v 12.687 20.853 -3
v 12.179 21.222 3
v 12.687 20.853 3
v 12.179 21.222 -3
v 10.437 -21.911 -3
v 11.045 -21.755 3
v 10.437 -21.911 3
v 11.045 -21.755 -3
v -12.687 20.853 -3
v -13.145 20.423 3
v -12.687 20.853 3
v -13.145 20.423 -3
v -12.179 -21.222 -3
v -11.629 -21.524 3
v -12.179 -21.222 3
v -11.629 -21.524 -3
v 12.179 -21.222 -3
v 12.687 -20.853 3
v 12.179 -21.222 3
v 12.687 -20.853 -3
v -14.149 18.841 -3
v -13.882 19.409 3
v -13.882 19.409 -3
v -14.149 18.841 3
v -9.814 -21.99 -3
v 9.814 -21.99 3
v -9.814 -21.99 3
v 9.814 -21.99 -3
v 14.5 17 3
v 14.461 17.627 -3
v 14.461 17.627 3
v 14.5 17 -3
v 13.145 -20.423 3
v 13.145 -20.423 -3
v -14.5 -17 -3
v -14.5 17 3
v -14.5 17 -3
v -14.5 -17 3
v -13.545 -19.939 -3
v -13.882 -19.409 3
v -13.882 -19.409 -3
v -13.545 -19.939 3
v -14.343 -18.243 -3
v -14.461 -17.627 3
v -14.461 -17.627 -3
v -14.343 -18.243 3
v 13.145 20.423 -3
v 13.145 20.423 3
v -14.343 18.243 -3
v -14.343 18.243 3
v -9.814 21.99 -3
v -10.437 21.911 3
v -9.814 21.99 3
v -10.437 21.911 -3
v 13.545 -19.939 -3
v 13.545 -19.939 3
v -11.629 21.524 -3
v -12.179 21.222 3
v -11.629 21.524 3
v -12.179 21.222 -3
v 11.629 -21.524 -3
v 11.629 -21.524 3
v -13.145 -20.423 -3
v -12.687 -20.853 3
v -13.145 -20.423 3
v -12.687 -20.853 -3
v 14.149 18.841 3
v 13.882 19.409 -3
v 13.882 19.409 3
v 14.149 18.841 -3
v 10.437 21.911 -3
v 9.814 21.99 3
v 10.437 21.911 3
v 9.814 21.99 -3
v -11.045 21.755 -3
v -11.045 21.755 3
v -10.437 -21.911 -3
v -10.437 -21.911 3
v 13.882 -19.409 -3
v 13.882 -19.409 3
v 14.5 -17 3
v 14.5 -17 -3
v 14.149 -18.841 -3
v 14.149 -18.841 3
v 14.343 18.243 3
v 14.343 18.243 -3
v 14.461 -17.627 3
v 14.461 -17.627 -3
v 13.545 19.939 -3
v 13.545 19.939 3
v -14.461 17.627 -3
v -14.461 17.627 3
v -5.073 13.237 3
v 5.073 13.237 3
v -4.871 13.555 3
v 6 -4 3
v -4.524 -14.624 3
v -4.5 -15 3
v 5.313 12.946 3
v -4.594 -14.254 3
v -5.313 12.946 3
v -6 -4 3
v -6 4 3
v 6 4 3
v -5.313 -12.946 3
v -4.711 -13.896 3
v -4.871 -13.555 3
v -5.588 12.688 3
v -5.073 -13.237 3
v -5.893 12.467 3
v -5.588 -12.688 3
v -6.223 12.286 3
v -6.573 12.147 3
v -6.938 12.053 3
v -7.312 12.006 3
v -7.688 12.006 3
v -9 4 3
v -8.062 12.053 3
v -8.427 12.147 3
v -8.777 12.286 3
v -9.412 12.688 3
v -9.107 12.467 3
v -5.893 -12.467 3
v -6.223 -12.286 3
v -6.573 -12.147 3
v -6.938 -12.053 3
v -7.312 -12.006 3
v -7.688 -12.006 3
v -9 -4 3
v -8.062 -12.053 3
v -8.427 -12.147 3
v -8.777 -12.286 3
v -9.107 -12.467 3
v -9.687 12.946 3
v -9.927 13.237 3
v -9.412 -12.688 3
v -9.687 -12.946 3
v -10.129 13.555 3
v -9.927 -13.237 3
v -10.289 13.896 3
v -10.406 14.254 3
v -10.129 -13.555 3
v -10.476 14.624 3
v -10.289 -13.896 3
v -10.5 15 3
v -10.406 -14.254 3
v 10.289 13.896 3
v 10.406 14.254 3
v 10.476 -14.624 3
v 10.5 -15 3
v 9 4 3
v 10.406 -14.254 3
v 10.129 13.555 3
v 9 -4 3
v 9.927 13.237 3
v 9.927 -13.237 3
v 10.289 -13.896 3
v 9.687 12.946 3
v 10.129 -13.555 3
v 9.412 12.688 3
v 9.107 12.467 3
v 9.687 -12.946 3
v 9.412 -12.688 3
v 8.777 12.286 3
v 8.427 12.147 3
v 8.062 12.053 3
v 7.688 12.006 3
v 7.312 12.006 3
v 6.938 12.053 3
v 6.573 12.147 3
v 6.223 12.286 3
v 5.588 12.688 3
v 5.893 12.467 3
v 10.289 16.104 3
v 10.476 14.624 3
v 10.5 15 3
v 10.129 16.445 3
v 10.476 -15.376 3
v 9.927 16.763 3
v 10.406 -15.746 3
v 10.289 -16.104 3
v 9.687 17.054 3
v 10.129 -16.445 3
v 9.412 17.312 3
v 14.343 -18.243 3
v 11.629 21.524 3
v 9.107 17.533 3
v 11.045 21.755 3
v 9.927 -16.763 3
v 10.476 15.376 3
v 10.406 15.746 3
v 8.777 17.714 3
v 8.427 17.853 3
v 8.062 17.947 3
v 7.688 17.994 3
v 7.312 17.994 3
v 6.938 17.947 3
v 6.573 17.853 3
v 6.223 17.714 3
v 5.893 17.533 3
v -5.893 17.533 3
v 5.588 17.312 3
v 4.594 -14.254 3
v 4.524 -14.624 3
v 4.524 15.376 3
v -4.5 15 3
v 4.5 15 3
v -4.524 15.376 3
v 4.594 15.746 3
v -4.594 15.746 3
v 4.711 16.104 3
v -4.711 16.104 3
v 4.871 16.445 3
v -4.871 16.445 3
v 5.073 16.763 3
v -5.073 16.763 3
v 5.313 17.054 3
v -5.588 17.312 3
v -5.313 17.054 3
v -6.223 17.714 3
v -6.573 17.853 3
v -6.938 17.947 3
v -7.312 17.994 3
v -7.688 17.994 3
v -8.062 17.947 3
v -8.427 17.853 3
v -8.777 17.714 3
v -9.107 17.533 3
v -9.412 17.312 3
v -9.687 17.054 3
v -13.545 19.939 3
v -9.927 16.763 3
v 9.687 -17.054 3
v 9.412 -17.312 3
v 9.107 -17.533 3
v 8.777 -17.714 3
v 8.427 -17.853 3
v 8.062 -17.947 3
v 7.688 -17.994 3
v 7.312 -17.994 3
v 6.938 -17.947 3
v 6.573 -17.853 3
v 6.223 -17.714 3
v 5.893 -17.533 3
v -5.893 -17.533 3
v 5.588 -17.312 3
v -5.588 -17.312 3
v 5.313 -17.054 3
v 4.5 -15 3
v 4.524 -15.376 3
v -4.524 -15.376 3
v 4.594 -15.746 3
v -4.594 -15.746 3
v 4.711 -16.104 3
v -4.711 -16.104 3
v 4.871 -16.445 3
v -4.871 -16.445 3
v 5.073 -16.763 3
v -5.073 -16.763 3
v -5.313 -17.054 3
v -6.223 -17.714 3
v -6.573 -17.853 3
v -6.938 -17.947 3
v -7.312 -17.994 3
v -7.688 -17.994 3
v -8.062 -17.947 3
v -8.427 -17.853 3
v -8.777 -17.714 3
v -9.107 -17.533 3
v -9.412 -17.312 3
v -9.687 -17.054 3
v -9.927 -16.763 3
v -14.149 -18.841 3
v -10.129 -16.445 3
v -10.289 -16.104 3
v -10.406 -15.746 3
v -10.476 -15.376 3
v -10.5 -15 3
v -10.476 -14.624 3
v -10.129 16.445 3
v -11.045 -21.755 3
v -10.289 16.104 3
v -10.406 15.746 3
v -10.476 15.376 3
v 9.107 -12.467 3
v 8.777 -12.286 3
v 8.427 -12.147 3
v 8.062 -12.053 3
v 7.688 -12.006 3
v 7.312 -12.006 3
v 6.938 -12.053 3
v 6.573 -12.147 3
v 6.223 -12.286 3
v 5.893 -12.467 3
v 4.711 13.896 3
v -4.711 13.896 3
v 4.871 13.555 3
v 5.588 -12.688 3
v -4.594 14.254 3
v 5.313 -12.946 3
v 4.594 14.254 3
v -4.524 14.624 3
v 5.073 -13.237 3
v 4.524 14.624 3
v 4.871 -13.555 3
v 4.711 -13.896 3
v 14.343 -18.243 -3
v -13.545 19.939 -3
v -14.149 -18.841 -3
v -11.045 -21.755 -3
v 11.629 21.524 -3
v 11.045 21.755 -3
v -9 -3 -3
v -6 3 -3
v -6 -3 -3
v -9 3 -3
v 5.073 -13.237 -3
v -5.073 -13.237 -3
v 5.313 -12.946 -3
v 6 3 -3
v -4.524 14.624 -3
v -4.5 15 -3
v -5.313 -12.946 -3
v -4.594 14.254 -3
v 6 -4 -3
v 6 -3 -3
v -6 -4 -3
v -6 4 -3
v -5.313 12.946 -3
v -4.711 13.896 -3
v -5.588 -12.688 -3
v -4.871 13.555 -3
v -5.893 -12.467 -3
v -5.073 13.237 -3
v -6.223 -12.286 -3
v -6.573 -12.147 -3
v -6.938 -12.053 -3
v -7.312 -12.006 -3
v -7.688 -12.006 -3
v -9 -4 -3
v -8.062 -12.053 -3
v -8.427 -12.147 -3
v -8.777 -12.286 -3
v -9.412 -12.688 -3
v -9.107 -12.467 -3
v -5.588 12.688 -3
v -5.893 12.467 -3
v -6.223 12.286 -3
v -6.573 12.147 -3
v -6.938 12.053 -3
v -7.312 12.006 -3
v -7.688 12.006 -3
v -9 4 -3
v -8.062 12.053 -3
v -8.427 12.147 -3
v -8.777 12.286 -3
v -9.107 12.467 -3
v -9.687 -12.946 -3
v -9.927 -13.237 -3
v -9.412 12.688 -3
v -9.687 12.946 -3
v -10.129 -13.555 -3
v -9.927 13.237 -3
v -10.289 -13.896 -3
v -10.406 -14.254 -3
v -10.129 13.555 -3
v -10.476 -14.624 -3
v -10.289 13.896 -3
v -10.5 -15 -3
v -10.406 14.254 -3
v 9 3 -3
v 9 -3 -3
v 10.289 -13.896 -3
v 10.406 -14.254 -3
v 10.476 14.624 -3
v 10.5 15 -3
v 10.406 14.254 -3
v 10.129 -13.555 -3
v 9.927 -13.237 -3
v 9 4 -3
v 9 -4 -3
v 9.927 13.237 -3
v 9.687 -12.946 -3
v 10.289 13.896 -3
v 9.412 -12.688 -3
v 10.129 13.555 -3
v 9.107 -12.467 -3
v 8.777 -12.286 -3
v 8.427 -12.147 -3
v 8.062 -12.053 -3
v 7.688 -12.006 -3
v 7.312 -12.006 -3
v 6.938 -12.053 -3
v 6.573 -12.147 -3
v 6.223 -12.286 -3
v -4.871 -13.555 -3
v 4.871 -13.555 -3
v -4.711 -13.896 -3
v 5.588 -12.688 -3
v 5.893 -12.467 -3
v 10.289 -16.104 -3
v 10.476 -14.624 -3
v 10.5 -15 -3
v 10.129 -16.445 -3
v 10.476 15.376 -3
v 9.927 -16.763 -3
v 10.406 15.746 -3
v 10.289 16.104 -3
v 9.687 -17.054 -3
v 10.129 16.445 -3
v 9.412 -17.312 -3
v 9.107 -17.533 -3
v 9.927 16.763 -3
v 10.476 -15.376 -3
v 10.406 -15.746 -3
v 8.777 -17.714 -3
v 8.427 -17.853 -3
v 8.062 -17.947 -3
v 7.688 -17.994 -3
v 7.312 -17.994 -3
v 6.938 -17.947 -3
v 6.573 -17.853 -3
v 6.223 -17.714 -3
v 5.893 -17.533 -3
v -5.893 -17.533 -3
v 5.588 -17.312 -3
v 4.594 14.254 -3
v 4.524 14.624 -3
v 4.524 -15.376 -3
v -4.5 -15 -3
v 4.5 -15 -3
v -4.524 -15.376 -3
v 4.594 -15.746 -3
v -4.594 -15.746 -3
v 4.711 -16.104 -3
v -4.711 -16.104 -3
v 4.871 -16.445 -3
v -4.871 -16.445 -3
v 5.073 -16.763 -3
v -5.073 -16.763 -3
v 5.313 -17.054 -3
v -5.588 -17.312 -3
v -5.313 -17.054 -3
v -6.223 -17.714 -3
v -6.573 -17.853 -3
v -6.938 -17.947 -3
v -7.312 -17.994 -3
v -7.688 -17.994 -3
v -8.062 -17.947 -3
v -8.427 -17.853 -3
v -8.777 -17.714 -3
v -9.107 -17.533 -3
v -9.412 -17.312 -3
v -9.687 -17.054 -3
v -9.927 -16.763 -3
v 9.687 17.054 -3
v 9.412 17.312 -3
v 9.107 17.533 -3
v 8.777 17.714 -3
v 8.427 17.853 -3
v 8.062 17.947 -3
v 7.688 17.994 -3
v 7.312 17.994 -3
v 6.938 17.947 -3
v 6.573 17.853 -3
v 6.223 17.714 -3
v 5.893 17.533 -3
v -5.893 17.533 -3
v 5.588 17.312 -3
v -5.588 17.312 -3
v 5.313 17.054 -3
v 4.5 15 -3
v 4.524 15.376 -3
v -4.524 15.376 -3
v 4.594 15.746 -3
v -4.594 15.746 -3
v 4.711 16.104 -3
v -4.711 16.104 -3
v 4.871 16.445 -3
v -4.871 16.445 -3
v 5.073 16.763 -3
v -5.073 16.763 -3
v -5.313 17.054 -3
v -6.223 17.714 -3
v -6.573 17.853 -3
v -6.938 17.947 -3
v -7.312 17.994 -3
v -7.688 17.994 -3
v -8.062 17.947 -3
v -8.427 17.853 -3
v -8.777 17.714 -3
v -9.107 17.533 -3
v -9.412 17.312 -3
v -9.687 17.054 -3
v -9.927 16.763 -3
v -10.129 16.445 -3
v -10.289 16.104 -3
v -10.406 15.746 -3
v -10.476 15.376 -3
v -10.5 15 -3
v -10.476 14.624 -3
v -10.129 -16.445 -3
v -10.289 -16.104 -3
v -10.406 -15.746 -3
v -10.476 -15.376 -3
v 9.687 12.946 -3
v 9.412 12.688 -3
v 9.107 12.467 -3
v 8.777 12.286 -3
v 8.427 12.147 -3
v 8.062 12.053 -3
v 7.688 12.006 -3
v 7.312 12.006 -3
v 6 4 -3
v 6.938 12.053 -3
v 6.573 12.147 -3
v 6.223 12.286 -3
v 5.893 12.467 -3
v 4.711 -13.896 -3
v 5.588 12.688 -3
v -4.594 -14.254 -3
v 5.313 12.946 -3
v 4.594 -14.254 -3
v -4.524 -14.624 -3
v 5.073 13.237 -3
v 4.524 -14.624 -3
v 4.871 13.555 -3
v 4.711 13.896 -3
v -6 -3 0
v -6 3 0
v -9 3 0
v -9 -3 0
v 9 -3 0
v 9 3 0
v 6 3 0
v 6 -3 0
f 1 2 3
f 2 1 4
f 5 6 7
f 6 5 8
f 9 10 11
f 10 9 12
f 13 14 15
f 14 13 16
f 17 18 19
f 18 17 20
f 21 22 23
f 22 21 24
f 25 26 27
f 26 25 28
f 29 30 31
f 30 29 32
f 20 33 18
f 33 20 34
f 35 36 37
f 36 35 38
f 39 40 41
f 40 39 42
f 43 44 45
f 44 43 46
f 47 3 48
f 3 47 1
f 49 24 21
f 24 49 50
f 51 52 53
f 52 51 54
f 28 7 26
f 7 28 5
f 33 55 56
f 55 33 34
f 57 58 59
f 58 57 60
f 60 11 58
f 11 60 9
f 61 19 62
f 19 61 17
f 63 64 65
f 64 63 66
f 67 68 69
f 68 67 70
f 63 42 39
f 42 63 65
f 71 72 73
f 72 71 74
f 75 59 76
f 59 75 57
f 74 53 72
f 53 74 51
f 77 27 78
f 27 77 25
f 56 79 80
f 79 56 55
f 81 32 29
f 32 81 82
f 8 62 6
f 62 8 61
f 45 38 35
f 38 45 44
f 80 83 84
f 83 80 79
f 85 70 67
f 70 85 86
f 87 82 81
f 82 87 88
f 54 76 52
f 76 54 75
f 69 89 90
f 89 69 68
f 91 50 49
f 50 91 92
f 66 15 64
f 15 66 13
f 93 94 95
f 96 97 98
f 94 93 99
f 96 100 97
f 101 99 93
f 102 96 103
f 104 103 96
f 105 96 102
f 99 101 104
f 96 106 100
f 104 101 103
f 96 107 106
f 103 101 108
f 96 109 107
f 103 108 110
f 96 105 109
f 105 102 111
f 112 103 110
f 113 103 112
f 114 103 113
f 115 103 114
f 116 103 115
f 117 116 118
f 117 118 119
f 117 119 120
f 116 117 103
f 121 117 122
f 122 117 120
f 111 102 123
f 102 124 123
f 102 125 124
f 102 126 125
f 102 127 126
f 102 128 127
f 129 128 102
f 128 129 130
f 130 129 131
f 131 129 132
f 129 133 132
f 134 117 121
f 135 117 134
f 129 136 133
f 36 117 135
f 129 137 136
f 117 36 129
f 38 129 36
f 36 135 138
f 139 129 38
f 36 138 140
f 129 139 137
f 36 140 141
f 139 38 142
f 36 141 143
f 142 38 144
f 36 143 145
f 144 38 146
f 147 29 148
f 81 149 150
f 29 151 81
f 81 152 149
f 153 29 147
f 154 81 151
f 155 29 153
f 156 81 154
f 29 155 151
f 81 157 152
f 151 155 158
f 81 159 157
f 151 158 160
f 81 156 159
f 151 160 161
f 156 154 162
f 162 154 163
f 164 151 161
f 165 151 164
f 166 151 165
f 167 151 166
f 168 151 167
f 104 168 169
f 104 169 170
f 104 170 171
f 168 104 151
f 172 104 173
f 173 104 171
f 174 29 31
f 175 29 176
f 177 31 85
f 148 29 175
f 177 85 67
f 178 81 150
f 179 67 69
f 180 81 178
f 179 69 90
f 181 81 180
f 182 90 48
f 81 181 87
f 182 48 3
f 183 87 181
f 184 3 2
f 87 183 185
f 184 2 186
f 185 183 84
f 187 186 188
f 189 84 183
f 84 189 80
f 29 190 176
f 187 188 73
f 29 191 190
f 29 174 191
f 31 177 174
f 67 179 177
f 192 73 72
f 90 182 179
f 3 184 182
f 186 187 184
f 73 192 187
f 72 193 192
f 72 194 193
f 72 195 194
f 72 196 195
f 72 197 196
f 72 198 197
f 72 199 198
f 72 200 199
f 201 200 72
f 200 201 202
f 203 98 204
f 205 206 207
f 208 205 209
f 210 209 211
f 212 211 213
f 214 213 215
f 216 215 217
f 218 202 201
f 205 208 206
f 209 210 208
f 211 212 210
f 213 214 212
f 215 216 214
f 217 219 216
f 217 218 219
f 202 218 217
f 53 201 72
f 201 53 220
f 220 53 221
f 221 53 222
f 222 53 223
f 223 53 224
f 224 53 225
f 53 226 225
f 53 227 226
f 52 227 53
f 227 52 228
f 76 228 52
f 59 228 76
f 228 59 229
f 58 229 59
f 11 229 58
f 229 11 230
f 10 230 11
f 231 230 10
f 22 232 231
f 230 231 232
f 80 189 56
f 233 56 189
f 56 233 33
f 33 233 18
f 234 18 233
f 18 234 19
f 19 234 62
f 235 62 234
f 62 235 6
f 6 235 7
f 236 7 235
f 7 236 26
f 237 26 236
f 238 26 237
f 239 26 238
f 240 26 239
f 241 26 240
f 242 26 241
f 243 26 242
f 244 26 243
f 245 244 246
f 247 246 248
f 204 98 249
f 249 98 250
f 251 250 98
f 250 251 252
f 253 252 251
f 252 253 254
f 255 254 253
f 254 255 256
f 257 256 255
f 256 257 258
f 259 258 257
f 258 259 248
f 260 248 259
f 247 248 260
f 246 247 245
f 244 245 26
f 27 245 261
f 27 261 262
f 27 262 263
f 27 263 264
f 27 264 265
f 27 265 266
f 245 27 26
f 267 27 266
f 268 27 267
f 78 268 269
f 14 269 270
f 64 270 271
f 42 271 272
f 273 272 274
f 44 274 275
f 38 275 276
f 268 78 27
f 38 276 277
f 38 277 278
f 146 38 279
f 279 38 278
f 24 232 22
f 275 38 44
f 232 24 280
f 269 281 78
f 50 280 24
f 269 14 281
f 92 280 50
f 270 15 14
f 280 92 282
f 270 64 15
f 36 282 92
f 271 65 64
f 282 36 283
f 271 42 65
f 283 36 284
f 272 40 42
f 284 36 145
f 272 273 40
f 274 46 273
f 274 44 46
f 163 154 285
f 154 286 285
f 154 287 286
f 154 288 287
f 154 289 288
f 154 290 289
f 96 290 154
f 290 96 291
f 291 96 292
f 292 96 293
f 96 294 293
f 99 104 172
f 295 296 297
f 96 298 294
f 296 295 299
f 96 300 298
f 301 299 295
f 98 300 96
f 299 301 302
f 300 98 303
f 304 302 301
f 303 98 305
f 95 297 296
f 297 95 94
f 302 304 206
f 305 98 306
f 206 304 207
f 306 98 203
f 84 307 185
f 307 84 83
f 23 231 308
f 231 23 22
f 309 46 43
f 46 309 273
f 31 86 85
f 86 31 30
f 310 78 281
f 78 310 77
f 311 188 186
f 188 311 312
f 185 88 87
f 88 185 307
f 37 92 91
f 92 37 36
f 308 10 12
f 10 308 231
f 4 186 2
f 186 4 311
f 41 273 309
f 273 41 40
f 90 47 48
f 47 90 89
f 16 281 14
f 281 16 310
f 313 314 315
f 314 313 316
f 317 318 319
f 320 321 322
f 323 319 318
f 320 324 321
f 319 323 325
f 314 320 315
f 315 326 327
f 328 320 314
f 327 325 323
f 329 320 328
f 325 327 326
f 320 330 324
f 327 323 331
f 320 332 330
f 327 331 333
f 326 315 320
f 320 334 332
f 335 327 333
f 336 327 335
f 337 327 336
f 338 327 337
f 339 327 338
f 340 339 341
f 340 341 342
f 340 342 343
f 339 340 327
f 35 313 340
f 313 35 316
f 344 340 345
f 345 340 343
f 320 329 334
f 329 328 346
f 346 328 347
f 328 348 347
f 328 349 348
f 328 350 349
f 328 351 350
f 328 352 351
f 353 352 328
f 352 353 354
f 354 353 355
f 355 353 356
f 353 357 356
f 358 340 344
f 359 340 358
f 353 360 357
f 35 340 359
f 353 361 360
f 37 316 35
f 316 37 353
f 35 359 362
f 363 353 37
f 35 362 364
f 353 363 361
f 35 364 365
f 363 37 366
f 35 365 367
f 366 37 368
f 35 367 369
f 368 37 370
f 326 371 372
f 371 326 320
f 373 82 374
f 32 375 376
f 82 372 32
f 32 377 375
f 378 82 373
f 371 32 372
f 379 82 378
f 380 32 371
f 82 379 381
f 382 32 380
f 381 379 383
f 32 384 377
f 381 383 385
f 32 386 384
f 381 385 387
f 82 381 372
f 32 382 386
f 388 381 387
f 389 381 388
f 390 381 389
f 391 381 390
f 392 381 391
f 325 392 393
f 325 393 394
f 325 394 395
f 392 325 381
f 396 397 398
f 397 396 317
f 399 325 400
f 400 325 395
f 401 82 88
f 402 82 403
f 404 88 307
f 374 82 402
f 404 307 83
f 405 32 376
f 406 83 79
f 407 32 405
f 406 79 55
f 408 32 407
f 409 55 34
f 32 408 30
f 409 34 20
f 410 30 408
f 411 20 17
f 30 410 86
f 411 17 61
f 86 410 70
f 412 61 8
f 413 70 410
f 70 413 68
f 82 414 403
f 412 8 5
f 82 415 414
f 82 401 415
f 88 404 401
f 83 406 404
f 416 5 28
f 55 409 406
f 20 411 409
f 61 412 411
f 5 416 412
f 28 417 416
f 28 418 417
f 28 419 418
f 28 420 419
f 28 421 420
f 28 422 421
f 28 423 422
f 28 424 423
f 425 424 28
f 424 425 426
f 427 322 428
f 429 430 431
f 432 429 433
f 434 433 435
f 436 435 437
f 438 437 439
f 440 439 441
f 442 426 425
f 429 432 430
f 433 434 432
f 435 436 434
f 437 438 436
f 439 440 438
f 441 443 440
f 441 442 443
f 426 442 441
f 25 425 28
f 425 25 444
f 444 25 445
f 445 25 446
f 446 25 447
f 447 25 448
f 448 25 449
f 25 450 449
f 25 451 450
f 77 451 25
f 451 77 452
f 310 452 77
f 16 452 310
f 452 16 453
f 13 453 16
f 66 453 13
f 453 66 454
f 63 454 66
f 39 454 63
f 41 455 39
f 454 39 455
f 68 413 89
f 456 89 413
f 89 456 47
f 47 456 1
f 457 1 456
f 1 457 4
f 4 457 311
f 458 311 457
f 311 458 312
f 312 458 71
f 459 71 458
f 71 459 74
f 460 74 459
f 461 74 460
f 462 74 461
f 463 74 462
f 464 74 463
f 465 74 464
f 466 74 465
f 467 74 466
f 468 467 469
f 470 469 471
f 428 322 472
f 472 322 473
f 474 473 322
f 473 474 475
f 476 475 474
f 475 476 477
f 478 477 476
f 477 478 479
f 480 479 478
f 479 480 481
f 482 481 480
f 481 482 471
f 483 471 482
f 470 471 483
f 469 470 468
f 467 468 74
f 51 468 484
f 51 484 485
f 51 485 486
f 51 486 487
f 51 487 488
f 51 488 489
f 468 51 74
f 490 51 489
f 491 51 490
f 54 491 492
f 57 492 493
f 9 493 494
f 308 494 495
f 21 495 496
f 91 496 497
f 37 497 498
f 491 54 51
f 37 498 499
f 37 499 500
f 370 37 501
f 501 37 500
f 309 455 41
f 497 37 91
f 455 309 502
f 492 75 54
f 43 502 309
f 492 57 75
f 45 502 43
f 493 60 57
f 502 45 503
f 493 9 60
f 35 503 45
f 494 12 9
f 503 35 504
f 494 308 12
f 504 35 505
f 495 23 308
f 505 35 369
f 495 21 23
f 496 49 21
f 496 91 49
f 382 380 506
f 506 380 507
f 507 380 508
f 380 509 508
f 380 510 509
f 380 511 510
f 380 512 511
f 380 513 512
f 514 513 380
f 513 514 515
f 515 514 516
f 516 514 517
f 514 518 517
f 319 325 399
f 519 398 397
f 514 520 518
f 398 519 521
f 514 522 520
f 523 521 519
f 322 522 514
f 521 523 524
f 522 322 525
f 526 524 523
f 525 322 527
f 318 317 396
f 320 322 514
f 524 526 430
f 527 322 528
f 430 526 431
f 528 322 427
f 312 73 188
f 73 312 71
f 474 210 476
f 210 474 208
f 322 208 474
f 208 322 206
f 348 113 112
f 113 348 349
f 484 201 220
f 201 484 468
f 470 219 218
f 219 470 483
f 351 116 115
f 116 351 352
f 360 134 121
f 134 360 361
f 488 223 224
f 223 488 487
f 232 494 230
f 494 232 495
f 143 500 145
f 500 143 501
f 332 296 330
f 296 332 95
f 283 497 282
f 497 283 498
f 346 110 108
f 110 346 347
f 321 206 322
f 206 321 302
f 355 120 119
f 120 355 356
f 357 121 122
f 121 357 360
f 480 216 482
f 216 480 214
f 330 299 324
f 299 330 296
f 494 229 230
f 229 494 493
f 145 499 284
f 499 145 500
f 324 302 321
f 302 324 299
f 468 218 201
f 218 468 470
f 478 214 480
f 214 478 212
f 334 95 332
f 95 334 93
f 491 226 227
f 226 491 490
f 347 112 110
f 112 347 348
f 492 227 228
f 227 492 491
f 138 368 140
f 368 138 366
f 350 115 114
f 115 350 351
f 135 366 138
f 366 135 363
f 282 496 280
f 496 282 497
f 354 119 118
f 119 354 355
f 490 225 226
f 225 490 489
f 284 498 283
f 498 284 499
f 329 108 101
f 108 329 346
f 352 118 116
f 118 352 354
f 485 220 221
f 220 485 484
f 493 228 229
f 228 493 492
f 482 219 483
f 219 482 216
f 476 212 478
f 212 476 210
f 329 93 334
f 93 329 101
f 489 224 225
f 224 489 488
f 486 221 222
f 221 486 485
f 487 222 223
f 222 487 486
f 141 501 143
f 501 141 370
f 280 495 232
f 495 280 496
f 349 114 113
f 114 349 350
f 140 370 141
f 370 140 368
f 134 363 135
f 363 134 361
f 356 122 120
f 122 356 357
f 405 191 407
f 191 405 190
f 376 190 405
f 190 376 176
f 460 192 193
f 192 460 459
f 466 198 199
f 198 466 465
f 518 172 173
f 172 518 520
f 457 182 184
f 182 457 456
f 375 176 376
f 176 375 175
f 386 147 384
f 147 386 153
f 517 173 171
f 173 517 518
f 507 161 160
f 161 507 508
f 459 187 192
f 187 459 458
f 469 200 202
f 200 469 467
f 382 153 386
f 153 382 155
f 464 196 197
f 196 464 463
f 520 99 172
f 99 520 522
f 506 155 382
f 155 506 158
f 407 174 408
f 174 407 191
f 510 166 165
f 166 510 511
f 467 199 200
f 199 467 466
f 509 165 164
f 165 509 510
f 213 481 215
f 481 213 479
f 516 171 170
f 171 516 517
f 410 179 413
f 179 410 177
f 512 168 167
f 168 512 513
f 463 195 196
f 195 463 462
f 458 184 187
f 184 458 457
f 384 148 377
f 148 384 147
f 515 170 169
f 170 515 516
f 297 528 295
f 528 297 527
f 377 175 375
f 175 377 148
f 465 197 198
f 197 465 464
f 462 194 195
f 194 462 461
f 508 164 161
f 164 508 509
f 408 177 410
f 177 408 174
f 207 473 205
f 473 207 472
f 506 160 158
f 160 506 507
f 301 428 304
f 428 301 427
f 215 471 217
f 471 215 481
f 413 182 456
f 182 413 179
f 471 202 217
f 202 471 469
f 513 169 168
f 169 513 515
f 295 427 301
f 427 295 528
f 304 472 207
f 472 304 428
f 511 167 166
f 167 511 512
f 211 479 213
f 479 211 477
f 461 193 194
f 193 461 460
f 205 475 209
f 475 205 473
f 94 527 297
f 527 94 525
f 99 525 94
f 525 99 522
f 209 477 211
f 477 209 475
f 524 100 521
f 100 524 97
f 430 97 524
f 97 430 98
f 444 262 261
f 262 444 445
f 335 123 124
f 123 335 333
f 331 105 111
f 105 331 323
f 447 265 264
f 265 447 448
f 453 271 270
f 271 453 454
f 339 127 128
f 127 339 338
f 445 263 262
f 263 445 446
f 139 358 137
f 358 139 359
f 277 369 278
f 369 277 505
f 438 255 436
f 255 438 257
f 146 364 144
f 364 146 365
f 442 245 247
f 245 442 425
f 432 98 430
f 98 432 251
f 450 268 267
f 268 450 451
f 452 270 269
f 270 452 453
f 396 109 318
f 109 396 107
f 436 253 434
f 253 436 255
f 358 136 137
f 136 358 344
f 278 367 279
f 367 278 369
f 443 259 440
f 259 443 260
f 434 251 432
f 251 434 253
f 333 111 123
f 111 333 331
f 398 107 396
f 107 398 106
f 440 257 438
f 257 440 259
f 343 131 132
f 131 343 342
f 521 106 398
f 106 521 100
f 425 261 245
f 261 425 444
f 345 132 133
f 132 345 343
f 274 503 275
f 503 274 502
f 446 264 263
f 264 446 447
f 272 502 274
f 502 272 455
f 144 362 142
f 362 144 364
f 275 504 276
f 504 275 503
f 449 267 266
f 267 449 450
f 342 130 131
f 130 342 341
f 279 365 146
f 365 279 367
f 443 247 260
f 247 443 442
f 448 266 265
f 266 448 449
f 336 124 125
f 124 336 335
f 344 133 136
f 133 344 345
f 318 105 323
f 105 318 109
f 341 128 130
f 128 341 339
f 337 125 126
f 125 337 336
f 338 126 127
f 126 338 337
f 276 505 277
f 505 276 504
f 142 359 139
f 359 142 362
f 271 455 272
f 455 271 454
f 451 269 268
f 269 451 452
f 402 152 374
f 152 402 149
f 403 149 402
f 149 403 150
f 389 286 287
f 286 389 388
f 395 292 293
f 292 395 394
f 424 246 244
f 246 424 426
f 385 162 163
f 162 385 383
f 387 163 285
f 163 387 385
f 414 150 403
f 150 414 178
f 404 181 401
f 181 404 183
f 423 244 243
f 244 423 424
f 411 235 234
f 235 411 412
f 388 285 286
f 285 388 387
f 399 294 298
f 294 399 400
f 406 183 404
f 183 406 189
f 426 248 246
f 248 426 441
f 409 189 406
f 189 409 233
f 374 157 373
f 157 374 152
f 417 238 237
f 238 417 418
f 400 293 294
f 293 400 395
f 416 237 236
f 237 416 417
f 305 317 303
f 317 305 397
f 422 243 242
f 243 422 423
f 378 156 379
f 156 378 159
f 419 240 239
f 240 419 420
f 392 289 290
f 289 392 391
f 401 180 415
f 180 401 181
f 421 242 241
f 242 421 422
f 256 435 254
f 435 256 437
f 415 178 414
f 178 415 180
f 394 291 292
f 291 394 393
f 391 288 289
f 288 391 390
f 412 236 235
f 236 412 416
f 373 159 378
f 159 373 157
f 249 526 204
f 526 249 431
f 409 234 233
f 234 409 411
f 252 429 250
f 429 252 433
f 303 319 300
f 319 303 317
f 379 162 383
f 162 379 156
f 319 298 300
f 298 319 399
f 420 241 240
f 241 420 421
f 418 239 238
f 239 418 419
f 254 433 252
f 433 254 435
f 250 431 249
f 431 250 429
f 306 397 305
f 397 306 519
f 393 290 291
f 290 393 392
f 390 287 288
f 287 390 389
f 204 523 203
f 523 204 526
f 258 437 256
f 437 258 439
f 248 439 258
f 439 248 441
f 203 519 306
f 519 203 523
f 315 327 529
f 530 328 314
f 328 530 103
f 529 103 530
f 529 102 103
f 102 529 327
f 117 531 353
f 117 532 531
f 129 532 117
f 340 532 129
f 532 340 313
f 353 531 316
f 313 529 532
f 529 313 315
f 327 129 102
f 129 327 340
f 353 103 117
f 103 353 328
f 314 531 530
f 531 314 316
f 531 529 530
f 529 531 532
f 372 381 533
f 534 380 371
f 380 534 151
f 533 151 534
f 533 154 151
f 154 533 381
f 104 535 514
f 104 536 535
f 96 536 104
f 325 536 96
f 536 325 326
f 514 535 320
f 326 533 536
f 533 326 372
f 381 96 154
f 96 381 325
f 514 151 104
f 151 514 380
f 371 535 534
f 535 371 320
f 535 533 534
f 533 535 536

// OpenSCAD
$fn = 50;


difference() {
	union() {
		translate(v = [0, 0, -3.0000000000]) {
			hull() {
				translate(v = [-9.5000000000, 17.0000000000, 0]) {
					cylinder(h = 6, r = 5);
				}
				translate(v = [9.5000000000, 17.0000000000, 0]) {
					cylinder(h = 6, r = 5);
				}
				translate(v = [-9.5000000000, -17.0000000000, 0]) {
					cylinder(h = 6, r = 5);
				}
				translate(v = [9.5000000000, -17.0000000000, 0]) {
					cylinder(h = 6, r = 5);
				}
			}
		}
		translate(v = [0, 0, -3.0000000000]) {
			hull() {
				translate(v = [-9.5000000000, 17.0000000000, 0]) {
					cylinder(h = 6, r = 5);
				}
				translate(v = [9.5000000000, 17.0000000000, 0]) {
					cylinder(h = 6, r = 5);
				}
				translate(v = [-9.5000000000, -17.0000000000, 0]) {
					cylinder(h = 6, r = 5);
				}
				translate(v = [9.5000000000, -17.0000000000, 0]) {
					cylinder(h = 6, r = 5);
				}
			}
		}
	}
	union() {
		translate(v = [-7.5000000000, 15.0000000000, -100.0000000000]) {
			cylinder(h = 200, r = 3.0000000000);
		}
		translate(v = [7.5000000000, 15.0000000000, -100.0000000000]) {
			cylinder(h = 200, r = 3.0000000000);
		}
		translate(v = [-7.5000000000, -15.0000000000, -100.0000000000]) {
			cylinder(h = 200, r = 3.0000000000);
		}
		translate(v = [7.5000000000, -15.0000000000, -100.0000000000]) {
			cylinder(h = 200, r = 3.0000000000);
		}
		translate(v = [-9.0000000000, -4.0000000000, -50]) {
			cube(size = [3, 1, 100]);
		}
		translate(v = [-9.0000000000, 3.0000000000, -50]) {
			cube(size = [3, 1, 100]);
		}
		translate(v = [-9.0000000000, -4.0000000000, 0]) {
			cube(size = [3, 8, 3]);
		}
		translate(v = [6.0000000000, -4.0000000000, -50]) {
			cube(size = [3, 1, 100]);
		}
		translate(v = [6.0000000000, 3.0000000000, -50]) {
			cube(size = [3, 1, 100]);
		}
		translate(v = [6.0000000000, -4.0000000000, 0]) {
			cube(size = [3, 8, 3]);
		}
	}
}
